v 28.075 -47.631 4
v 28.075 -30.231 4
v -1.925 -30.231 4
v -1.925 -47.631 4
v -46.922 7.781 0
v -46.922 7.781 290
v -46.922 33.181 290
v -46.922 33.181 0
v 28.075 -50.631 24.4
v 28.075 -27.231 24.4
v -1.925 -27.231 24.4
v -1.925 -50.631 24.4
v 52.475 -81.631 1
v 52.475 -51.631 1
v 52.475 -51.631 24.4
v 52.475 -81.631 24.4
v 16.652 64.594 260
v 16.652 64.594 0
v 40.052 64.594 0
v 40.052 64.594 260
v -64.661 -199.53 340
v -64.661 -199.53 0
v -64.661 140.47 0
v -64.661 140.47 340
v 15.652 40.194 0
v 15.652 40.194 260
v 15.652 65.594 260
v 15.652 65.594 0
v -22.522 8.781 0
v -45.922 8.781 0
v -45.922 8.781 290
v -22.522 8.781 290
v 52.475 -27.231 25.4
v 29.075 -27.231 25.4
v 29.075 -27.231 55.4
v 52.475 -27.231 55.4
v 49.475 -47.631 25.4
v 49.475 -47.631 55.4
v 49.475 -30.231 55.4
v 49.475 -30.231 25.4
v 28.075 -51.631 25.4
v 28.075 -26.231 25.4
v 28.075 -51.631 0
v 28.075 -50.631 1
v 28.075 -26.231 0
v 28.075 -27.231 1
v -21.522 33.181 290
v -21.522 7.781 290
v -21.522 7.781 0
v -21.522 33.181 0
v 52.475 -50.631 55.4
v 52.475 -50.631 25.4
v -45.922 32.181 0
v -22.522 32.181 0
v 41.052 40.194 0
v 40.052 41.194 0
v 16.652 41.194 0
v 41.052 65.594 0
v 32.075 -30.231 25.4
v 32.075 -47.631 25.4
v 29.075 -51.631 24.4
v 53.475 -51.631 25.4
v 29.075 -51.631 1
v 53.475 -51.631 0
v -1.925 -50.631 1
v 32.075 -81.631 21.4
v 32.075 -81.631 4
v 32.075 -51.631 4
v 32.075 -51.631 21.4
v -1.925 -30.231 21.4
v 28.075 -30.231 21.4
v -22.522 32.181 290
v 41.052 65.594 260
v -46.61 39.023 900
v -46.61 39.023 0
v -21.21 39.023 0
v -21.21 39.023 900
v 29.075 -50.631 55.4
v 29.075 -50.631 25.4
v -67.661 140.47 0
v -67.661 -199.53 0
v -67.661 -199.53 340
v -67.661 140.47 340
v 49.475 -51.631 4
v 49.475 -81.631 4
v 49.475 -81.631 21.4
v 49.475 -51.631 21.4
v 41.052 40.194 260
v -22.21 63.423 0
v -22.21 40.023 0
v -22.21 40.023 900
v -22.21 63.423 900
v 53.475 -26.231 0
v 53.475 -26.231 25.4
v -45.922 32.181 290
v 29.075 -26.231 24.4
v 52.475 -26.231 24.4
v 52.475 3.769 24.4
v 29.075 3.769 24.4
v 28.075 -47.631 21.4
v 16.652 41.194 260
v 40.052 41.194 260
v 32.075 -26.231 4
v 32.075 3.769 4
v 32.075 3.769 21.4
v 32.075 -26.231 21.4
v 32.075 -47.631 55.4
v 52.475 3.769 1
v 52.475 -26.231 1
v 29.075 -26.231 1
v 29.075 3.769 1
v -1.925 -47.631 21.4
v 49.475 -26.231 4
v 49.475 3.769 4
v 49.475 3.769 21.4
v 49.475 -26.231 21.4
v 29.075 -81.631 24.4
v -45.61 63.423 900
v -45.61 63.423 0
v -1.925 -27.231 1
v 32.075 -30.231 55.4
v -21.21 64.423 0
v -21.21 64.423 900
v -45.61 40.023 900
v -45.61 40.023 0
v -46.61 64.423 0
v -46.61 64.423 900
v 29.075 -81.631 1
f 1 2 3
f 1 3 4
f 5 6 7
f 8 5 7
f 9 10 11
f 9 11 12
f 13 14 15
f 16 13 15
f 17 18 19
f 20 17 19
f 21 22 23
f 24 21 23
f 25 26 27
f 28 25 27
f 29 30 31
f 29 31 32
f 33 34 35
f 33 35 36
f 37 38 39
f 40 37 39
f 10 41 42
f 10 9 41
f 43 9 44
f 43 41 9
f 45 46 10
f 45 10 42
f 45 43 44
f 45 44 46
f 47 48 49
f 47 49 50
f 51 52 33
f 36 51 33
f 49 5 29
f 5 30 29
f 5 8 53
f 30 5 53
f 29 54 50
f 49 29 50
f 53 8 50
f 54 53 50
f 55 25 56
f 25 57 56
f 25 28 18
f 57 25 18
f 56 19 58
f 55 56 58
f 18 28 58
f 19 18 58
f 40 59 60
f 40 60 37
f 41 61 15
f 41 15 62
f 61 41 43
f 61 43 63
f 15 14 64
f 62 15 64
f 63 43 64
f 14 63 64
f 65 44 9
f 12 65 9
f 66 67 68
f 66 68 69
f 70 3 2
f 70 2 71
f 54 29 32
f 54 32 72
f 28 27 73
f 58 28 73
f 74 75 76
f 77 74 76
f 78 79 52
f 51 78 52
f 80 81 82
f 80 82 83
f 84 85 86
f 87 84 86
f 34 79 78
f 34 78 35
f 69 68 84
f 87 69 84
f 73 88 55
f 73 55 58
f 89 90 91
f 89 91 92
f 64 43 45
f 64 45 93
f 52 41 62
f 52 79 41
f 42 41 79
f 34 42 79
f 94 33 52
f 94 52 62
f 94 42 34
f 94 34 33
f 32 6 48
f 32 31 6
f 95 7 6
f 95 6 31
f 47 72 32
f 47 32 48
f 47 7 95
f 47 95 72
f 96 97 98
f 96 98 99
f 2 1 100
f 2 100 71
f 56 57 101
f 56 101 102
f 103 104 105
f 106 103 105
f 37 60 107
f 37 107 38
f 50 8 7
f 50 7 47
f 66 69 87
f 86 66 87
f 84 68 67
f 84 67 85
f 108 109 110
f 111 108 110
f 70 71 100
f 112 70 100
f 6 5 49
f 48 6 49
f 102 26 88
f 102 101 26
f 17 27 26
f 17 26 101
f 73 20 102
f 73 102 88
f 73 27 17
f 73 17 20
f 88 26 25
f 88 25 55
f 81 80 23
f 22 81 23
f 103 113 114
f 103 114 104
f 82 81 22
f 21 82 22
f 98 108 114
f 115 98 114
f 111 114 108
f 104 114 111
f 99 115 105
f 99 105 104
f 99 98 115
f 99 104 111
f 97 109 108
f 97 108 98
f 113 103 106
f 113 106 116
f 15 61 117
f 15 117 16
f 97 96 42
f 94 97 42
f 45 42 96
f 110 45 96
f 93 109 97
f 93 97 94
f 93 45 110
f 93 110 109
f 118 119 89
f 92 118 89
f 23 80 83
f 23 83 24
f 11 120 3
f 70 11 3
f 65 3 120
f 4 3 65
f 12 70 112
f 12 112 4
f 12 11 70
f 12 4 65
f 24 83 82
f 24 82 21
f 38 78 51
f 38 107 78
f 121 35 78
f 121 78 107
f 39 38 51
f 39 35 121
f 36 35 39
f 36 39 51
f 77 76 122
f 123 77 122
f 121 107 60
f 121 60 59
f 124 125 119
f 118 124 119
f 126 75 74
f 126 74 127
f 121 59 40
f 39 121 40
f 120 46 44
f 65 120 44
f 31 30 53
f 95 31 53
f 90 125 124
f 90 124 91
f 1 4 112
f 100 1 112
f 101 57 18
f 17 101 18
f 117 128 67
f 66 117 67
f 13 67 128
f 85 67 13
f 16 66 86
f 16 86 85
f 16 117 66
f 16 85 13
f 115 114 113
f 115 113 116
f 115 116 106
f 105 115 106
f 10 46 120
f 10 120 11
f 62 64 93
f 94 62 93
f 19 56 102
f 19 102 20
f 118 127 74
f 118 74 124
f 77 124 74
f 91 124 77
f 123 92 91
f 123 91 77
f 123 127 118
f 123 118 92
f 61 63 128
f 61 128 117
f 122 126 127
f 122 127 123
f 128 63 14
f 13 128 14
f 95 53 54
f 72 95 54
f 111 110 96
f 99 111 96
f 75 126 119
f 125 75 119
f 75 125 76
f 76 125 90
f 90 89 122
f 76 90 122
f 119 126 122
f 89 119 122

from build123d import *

# Parameters (mm, degrees)
F0_W      = 25.4
F0_H      = 25.4
F0_W_2    = 23.4
F0_H_2    = 23.4
F1_DEPTH  = 290
F2_W      = 25.4
F2_H      = 25.4
F2_W_2    = 23.4
F2_H_2    = 23.4
F3_DEPTH  = 900
F4_W      = 25.4
F4_H      = 25.4
F5_DEPTH  = 25.4
F6_W      = 23.4
F6_H      = 23.4
F6_W_2    = 17.4
F6_H_2    = 17.4
F7_DEPTH  = 30
F8_W      = 23.4
F8_H      = 23.4
F8_W_2    = 17.4
F8_H_2    = 17.4
F9_DEPTH  = 30
F10_W     = 23.4
F10_H     = 23.4
F10_W_2   = 17.4
F10_H_2   = 17.4
F11_DEPTH = 30
F12_W     = 23.4
F12_H     = 23.4
F12_W_2   = 17.4
F12_H_2   = 17.4
F13_DEPTH = 30
F14_W     = 25.4
F14_H     = 25.4
F14_W_2   = 23.4
F14_H_2   = 23.4
F15_DEPTH = 260
F16_W     = 3
F16_H     = 340
F17_DEPTH = 340


with BuildPart() as f1:
    # F0 (on Top) → F1 (new body)
    with BuildSketch(Plane.XY):
        with Locations((-34.222287, 20.481436)):
            Rectangle(F0_W, F0_H)
        with Locations((-34.222287, 20.481436)):
            Rectangle(F0_W_2, F0_H_2, mode=Mode.SUBTRACT)
    extrude(amount=F1_DEPTH)


with BuildPart() as f3:
    # F2 (on Top) → F3 (new body)
    with BuildSketch(Plane.XY):
        with Locations((-33.910381, 51.72298)):
            Rectangle(F2_W, F2_H)
        with Locations((-33.910381, 51.72298)):
            Rectangle(F2_W_2, F2_H_2, mode=Mode.SUBTRACT)
    extrude(amount=F3_DEPTH)


with BuildPart() as f5:
    # F4 (on Top) → F5 (new body)
    with BuildSketch(Plane.XY):
        with Locations((40.774587, -38.931455)):
            Rectangle(F4_W, F4_H)
    extrude(amount=F5_DEPTH)

    # F6 (on face) → F7 (join)
    with BuildSketch(Plane.XY.offset(25.4)):
        with Locations((40.774587, -38.931455)):
            Rectangle(F6_W, F6_H)
        with Locations((40.774587, -38.931455)):
            Rectangle(F6_W_2, F6_H_2, mode=Mode.SUBTRACT)
    extrude(amount=F7_DEPTH)

    # F8 (on face) → F9 (join)
    with BuildSketch(Plane(origin=(28.074587, 0, 0), x_dir=(0, -1, 0), z_dir=(-1, 0, 0))):
        with Locations((38.931455, 12.7)):
            Rectangle(F8_W, F8_H)
        with Locations((38.931455, 12.7)):
            Rectangle(F8_W_2, F8_H_2, mode=Mode.SUBTRACT)
    extrude(amount=F9_DEPTH)

    # F10 (on face) → F11 (join)
    with BuildSketch(Plane.XZ.offset(51.631455)):
        with Locations((40.774587, 12.7)):
            Rectangle(F10_W, F10_H)
        with Locations((40.774587, 12.7)):
            Rectangle(F10_W_2, F10_H_2, mode=Mode.SUBTRACT)
    extrude(amount=F11_DEPTH)

    # F12 (on face) → F13 (join)
    with BuildSketch(Plane(origin=(0, -26.231455, 0), x_dir=(-1, 0, 0), z_dir=(0, 1, 0))):
        with Locations((-40.774587, 12.7)):
            Rectangle(F12_W, F12_H)
        with Locations((-40.774587, 12.7)):
            Rectangle(F12_W_2, F12_H_2, mode=Mode.SUBTRACT)
    extrude(amount=F13_DEPTH)


with BuildPart() as f15:
    # F14 (on Top) → F15 (new body)
    with BuildSketch(Plane.XY):
        with Locations((28.352336, 52.893695)):
            Rectangle(F14_W, F14_H)
        with Locations((28.352336, 52.893695)):
            Rectangle(F14_W_2, F14_H_2, mode=Mode.SUBTRACT)
    extrude(amount=F15_DEPTH)


with BuildPart() as f17:
    # F16 (on Top) → F17 (new body)
    with BuildSketch(Plane.XY):
        with Locations((-66.161152, -29.530468)):
            Rectangle(F16_W, F16_H)
    extrude(amount=F17_DEPTH)


solid = Compound([f1.part, f3.part, f5.part, f15.part, f17.part])
